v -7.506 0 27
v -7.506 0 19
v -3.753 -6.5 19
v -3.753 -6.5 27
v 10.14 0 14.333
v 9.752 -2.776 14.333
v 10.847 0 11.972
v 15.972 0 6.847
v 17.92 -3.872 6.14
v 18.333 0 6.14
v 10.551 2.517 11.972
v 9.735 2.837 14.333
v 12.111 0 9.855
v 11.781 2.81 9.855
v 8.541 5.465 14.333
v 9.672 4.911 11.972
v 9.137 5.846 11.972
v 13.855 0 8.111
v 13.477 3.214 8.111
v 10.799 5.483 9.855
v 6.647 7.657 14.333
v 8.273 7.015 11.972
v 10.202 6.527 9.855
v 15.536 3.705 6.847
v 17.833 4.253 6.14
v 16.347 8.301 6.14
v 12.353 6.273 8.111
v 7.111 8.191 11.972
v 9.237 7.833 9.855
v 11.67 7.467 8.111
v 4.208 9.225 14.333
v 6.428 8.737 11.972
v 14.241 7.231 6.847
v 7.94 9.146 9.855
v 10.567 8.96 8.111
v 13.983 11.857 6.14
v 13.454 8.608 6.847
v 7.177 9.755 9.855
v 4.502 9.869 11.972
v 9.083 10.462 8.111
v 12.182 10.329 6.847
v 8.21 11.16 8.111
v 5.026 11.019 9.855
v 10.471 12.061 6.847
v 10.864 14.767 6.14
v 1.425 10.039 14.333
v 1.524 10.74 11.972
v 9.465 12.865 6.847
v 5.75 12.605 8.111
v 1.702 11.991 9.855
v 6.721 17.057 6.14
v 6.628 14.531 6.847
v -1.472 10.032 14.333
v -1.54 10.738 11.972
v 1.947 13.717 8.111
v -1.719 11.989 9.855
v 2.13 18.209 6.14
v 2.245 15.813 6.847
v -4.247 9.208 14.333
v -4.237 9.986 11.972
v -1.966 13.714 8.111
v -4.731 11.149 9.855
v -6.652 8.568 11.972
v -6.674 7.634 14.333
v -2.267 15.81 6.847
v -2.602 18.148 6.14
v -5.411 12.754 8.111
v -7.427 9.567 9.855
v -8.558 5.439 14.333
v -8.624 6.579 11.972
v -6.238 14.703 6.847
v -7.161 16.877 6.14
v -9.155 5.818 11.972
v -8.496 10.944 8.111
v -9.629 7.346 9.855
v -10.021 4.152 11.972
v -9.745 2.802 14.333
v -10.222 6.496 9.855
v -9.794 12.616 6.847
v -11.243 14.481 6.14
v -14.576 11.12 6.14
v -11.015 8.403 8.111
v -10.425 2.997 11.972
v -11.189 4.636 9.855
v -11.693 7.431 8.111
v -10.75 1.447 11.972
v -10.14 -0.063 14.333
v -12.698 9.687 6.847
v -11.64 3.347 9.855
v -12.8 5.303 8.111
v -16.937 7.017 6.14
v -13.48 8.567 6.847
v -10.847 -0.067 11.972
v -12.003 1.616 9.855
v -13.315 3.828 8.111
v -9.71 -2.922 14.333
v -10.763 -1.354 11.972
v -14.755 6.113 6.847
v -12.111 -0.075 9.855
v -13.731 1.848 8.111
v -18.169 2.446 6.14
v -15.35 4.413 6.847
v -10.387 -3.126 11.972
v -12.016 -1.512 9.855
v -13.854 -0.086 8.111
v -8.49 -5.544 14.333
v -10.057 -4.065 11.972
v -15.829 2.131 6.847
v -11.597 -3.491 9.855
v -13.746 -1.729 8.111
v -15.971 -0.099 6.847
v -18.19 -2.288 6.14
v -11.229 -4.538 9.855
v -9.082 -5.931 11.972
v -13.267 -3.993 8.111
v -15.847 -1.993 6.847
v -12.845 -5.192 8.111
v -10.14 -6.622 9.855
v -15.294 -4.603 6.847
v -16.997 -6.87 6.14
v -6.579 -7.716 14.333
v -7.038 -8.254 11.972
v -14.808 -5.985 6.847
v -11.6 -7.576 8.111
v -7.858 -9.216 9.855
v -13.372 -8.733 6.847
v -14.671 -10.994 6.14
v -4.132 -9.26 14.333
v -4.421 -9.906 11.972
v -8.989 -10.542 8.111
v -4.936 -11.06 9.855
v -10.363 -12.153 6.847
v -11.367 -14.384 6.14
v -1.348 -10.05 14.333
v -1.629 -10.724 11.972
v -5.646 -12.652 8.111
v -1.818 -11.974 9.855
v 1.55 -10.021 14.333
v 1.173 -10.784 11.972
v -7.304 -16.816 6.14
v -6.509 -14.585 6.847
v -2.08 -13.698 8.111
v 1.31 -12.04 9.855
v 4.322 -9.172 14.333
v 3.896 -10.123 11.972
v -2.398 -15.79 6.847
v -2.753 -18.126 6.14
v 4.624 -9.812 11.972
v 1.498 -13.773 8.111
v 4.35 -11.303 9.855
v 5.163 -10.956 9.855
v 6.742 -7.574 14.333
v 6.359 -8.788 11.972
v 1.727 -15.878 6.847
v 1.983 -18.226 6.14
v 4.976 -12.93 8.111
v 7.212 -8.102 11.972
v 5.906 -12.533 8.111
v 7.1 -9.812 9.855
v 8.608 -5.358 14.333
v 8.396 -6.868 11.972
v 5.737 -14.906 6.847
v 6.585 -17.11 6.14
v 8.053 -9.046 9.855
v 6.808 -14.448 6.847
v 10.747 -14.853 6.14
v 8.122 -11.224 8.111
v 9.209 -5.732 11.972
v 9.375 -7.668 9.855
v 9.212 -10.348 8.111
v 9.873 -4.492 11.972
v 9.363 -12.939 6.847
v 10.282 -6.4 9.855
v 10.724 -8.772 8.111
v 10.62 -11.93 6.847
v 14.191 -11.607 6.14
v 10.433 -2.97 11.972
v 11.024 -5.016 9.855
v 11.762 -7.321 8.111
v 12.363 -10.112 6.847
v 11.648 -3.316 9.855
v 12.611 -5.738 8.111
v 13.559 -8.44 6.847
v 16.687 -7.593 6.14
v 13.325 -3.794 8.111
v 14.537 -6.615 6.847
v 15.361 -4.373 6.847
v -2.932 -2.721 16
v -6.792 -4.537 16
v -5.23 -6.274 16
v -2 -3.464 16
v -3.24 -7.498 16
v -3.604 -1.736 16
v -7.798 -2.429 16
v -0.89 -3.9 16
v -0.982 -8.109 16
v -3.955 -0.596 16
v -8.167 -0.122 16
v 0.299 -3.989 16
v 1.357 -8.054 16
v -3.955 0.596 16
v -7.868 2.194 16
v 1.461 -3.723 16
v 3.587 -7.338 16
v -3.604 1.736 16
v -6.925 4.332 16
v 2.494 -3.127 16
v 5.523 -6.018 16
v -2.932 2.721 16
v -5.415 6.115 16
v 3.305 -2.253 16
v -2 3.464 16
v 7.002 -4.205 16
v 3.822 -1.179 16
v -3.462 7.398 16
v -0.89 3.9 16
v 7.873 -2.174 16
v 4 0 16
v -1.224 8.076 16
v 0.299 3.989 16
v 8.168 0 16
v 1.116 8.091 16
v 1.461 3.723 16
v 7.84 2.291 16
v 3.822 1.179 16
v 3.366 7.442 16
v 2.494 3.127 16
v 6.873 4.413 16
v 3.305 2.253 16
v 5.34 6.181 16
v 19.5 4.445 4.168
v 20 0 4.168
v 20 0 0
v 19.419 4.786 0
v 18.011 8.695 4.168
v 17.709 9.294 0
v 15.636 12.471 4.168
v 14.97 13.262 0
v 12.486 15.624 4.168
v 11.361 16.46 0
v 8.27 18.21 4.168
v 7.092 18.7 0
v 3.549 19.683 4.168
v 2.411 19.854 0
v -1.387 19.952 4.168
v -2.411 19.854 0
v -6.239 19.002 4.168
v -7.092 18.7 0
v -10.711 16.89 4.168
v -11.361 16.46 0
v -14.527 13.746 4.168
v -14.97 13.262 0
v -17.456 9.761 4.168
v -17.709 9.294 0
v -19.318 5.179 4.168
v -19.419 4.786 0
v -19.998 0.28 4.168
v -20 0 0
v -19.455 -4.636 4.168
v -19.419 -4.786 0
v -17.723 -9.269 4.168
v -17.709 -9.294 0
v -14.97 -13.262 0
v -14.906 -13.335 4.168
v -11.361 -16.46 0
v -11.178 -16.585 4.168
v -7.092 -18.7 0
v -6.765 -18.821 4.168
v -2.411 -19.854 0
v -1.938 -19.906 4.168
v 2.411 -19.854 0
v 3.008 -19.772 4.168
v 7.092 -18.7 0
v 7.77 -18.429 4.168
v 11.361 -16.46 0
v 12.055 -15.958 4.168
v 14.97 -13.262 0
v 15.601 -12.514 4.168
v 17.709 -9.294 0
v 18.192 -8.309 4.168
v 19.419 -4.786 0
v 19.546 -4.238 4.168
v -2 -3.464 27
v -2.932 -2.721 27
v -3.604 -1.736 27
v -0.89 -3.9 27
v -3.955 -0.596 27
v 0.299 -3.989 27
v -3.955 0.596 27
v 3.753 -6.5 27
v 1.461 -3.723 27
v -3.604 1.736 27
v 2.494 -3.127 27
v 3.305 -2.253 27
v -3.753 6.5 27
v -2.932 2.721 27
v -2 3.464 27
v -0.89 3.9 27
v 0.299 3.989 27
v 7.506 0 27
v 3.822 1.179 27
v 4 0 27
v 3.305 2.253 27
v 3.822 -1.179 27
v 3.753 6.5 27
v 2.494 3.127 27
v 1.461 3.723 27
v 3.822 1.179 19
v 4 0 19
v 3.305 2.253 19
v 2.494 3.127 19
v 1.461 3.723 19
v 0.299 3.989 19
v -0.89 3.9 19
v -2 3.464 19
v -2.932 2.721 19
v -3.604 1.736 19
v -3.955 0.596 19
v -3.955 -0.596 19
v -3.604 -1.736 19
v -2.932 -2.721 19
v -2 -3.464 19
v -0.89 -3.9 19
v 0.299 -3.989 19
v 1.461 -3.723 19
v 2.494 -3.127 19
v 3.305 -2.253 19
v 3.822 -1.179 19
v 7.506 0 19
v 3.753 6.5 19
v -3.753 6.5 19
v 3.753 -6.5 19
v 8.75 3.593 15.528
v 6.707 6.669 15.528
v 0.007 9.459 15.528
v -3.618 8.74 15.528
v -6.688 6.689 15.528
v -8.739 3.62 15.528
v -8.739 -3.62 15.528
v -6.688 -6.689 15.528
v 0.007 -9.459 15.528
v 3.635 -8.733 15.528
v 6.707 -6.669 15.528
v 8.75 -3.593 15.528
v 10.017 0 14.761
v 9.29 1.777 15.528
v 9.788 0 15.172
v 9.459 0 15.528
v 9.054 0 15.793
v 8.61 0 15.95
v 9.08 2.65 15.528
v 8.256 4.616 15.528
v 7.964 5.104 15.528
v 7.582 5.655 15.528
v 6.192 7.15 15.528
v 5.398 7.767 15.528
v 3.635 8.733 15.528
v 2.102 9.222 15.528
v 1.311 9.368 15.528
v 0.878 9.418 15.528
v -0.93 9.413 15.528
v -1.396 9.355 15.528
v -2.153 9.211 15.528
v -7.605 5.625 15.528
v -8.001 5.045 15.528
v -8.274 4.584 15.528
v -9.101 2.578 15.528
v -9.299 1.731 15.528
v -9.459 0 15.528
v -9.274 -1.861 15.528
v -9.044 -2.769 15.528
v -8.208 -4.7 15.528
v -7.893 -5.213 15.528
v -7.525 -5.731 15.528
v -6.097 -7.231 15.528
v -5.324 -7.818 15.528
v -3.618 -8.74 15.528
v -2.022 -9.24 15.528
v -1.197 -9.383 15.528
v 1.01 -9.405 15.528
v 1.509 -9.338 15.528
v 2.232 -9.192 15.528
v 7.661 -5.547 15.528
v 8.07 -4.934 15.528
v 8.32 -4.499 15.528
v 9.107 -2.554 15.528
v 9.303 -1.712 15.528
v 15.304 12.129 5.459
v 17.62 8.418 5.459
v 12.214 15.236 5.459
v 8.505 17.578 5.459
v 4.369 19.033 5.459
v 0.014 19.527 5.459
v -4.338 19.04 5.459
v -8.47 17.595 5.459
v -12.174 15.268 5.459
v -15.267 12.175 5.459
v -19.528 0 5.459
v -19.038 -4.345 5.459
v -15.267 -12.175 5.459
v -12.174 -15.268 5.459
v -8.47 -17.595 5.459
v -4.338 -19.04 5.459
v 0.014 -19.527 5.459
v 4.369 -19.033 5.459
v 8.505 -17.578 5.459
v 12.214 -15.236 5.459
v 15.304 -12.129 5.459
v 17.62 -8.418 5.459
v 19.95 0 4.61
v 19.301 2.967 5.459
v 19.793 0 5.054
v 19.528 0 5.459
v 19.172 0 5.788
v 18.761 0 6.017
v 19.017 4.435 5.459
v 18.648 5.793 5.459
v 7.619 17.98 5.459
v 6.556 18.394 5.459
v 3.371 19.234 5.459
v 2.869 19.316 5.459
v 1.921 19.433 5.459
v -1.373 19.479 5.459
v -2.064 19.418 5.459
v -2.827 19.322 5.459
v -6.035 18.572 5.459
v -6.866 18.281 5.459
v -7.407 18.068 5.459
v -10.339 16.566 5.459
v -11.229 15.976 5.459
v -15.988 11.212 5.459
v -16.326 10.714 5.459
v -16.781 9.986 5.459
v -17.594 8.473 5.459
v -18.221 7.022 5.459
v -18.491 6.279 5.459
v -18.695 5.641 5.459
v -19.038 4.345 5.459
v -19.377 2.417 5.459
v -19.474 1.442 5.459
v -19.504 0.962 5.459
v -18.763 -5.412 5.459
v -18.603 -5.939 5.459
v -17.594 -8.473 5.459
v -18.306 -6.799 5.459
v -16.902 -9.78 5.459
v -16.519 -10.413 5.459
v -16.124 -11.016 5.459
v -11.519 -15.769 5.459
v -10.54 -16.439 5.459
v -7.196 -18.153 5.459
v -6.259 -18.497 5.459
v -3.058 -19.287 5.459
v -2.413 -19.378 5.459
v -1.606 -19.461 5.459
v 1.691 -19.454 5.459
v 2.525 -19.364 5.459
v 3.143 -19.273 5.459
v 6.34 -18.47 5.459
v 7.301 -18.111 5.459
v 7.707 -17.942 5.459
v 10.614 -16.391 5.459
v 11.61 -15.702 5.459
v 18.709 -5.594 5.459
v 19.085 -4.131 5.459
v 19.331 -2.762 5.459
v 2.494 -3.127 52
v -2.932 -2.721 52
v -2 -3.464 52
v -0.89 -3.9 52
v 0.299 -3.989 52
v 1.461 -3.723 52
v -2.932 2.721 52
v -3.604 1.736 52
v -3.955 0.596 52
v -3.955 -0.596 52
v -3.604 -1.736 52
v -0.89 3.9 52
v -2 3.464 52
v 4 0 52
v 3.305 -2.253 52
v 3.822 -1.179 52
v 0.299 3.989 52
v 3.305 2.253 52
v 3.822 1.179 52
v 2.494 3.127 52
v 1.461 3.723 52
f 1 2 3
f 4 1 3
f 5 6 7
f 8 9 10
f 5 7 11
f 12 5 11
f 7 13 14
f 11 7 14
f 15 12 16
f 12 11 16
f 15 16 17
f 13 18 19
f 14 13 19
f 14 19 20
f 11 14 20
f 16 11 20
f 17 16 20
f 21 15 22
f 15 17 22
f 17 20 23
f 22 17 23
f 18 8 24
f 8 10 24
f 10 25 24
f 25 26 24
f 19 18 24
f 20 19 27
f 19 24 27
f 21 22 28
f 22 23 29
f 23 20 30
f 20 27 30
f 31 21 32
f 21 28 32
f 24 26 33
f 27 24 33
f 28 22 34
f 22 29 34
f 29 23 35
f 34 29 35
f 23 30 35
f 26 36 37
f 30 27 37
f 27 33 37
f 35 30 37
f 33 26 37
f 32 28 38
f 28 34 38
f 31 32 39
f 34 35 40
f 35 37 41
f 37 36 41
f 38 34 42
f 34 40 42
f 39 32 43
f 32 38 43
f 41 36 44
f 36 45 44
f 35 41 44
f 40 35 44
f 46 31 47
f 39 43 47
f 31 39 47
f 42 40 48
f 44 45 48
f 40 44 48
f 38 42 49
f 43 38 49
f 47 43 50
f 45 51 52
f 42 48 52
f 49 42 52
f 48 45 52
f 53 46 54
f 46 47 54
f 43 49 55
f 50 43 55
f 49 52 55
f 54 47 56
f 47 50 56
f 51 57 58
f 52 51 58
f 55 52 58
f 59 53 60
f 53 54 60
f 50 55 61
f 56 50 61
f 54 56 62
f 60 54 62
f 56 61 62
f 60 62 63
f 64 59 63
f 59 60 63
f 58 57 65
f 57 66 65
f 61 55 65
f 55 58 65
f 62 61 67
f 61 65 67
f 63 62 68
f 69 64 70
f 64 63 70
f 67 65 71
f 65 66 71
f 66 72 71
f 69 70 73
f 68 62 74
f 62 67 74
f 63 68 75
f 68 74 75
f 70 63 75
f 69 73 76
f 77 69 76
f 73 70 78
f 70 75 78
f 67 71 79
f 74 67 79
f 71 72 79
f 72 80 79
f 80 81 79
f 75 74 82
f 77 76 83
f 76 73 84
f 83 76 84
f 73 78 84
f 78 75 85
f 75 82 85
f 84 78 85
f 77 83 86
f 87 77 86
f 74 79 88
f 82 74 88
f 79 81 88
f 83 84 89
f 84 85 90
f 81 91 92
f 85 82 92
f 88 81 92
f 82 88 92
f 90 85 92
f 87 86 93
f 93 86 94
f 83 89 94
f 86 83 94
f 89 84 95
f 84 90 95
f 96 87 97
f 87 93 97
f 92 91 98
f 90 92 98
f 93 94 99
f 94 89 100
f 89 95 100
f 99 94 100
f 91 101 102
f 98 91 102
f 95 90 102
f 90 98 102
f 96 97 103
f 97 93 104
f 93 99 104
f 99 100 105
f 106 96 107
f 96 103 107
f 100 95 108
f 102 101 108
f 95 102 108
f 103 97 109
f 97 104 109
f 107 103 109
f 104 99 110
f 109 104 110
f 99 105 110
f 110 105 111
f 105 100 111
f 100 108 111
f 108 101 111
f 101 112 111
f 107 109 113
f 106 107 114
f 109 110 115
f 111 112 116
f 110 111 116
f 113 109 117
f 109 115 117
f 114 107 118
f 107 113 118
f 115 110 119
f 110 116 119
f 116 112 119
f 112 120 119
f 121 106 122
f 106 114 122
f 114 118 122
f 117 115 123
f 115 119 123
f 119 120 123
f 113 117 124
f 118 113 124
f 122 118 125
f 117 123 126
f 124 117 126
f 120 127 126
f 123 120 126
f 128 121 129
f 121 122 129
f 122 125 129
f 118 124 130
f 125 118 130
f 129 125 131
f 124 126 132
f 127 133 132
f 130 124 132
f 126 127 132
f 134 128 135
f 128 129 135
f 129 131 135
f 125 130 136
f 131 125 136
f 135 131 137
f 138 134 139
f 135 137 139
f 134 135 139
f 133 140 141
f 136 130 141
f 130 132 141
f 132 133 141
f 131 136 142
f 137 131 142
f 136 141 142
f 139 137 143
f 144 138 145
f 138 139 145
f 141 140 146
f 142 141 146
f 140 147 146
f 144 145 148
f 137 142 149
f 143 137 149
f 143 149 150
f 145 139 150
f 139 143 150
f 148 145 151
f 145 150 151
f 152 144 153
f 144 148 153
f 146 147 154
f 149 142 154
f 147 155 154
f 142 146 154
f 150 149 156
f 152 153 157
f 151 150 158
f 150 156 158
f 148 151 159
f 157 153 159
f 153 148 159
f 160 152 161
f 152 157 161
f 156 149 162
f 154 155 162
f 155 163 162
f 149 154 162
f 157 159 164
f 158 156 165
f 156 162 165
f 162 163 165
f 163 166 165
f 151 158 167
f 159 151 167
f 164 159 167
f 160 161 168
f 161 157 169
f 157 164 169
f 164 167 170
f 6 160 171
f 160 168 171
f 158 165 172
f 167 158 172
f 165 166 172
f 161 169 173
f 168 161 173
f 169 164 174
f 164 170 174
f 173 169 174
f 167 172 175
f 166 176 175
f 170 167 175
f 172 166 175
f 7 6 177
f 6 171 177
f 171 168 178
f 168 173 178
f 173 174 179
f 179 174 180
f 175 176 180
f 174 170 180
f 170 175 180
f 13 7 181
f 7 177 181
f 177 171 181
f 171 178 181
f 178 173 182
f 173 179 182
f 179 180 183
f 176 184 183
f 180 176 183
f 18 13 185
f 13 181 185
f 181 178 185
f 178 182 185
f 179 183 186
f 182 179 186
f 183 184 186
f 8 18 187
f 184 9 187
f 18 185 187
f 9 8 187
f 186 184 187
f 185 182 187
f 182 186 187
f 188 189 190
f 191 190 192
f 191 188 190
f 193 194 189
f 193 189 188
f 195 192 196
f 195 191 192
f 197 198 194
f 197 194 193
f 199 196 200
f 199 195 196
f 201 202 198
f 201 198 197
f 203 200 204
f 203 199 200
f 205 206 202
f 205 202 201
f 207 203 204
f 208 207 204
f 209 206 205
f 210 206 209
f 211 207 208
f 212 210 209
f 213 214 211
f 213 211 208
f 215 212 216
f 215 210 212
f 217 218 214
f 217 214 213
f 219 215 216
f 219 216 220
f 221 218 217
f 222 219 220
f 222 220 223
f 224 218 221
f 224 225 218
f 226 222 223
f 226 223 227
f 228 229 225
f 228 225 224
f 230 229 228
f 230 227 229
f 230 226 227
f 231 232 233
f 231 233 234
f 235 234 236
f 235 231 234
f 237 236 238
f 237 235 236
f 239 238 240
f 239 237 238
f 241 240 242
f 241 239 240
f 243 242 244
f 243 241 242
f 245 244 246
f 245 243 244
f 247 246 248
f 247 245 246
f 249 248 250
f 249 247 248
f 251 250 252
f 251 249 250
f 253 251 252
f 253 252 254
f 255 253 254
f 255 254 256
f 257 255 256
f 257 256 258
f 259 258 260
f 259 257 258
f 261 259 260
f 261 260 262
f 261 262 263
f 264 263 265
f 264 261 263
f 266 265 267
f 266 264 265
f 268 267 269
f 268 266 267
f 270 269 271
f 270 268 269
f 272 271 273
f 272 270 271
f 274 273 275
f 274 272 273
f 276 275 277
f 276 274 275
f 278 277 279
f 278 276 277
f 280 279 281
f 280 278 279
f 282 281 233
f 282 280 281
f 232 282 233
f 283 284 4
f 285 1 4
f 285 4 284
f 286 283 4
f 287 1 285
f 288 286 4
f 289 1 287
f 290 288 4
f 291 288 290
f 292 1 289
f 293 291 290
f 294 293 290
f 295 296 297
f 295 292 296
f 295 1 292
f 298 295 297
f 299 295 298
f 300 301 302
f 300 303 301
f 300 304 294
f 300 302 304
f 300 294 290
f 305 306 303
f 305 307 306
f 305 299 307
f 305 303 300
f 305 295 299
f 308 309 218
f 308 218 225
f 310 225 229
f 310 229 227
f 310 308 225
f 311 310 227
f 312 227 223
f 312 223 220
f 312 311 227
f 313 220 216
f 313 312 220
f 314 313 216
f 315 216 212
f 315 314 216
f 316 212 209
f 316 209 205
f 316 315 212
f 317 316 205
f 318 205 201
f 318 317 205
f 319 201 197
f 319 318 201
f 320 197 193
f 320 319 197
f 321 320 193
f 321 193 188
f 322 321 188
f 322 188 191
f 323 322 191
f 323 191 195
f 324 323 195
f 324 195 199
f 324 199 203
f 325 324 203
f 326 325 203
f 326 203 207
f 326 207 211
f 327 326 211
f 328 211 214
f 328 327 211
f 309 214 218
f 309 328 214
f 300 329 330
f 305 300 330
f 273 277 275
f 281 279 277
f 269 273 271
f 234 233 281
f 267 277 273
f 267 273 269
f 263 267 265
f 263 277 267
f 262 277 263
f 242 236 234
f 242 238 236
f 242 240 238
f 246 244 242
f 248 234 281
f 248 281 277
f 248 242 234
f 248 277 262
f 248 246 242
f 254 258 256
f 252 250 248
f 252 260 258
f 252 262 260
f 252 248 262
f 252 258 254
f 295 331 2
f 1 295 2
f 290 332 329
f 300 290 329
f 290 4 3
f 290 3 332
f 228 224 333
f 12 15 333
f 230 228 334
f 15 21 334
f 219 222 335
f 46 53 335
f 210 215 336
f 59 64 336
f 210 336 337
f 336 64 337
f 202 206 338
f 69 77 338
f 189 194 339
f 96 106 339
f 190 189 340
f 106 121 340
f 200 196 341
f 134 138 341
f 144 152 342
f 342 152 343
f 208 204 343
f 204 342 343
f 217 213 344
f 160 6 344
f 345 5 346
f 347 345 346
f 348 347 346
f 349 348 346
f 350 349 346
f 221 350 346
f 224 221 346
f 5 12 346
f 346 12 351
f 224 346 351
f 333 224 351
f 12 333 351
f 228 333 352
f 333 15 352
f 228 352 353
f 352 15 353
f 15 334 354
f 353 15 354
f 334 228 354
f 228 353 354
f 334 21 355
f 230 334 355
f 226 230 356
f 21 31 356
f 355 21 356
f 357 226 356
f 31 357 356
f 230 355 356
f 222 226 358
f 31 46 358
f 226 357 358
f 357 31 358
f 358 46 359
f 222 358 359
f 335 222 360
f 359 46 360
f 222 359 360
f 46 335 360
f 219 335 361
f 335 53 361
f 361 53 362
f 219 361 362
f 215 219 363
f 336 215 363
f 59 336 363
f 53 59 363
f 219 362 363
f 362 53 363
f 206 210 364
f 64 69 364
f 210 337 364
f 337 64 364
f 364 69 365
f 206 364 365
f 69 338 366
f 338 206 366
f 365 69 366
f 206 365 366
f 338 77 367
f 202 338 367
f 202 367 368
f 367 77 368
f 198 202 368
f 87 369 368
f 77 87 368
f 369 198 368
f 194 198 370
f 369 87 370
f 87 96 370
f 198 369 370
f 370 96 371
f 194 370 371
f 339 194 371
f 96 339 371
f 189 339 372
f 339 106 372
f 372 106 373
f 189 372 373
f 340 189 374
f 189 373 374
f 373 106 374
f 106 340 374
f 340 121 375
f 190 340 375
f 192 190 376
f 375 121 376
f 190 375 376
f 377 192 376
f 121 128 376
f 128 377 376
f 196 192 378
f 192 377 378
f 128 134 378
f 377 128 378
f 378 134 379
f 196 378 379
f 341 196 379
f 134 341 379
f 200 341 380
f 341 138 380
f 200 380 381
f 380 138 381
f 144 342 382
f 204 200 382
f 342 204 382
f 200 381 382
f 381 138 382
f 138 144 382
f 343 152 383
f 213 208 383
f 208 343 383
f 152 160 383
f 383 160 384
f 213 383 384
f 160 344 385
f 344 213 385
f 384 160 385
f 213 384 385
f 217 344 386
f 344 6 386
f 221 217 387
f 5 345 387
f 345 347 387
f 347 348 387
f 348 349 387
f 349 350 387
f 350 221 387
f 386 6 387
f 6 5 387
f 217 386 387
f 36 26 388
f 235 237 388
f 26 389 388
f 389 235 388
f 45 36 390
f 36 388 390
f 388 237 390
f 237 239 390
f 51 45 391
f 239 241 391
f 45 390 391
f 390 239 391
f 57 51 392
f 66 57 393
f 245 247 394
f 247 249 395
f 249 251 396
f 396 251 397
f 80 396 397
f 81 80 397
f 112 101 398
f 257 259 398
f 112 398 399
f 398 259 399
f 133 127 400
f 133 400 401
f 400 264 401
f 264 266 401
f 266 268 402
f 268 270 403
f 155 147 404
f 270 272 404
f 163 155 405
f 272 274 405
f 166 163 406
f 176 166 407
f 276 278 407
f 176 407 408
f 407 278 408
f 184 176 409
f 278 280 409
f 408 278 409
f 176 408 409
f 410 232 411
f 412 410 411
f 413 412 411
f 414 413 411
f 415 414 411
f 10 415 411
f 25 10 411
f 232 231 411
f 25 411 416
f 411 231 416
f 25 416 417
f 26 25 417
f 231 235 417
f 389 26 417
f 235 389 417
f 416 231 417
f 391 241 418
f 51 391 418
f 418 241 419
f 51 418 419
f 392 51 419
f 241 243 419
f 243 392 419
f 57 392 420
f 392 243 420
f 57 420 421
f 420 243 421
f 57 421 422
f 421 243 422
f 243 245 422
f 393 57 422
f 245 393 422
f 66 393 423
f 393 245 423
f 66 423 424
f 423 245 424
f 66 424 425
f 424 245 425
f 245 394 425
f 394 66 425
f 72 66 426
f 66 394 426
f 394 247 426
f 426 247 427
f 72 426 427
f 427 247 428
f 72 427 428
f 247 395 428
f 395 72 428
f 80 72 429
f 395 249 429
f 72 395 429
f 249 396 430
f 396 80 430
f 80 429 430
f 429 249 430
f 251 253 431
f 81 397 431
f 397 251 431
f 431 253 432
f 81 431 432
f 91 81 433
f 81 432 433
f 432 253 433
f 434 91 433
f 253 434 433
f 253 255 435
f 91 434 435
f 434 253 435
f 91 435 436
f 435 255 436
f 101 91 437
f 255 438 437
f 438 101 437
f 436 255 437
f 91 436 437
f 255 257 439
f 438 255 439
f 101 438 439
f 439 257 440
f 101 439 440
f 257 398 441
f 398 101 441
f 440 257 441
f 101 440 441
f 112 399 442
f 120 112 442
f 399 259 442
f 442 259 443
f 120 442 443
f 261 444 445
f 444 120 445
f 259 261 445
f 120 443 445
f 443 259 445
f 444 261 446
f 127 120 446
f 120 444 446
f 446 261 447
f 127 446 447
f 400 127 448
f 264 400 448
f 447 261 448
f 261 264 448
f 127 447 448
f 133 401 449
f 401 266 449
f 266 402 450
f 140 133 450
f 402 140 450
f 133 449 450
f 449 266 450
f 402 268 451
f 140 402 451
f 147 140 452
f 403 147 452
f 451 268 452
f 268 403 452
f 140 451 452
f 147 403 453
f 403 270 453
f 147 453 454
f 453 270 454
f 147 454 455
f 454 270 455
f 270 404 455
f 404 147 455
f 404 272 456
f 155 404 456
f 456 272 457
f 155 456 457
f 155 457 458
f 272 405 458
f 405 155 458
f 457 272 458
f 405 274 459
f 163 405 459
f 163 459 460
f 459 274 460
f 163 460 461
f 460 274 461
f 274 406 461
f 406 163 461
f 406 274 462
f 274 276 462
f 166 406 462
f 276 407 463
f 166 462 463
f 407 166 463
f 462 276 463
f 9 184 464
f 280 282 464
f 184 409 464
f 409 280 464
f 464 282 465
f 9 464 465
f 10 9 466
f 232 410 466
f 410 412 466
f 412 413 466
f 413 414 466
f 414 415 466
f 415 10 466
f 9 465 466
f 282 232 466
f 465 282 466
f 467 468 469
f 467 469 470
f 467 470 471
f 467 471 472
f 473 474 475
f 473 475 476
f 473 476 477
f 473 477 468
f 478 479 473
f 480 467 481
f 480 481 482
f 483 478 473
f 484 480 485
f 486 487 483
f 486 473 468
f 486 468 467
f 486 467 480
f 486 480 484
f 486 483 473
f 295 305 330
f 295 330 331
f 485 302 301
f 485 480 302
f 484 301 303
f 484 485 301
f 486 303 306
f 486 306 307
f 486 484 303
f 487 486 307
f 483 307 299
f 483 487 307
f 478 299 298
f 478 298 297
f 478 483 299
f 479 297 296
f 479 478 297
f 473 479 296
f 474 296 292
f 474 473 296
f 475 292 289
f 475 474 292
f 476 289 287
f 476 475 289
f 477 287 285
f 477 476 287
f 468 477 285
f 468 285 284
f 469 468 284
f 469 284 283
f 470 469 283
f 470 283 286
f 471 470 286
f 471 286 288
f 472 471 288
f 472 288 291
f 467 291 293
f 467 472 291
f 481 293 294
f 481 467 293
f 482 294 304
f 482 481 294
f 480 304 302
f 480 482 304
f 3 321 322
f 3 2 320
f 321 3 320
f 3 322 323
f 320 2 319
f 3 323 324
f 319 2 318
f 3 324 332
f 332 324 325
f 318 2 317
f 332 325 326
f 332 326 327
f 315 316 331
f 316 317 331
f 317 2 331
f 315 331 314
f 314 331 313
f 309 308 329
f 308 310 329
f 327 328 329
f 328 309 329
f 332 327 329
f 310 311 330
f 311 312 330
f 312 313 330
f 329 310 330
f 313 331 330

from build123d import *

# Parameters (mm, degrees)
FILLET_R  = 2
PAD_DEPTH = 8


with BuildPart() as part:
    # Sketch → Revolution (revolve)
    with BuildSketch(Plane.XZ):
        with BuildLine():
            Line((0, 0), (20, 0))
            Line((20, 0), (20, 6))
            ThreePointArc((10, 16), (12.928932, 8.928932), (20, 6))
            Line((10, 16), (4, 16))
            Line((4, 16), (4, 52))
            Line((4, 52), (0, 52))
            Line((0, 52), (0, 0))
        make_face()
    revolve(axis=Axis((0, 0, 0), (0, 0, 1)))

    # Fillet
    fillet_edges = [part.edges().sort_by_distance(p)[0] for p in [
        (-10, 0, 16),
        (-20, 0, 6),
    ]]
    fillet(fillet_edges, radius=FILLET_R)

    # Sketch001 (on DatumPlane) → Pad (new body)
    with BuildSketch(Plane.XY.offset(19)):
        Polygon((3.752777, 6.5), (-3.752777, 6.5), (-7.505553, 0), (-3.752777, -6.5), (3.752777, -6.5), (7.505553, 0), align=None)
    extrude(amount=PAD_DEPTH)


solid = part.part
